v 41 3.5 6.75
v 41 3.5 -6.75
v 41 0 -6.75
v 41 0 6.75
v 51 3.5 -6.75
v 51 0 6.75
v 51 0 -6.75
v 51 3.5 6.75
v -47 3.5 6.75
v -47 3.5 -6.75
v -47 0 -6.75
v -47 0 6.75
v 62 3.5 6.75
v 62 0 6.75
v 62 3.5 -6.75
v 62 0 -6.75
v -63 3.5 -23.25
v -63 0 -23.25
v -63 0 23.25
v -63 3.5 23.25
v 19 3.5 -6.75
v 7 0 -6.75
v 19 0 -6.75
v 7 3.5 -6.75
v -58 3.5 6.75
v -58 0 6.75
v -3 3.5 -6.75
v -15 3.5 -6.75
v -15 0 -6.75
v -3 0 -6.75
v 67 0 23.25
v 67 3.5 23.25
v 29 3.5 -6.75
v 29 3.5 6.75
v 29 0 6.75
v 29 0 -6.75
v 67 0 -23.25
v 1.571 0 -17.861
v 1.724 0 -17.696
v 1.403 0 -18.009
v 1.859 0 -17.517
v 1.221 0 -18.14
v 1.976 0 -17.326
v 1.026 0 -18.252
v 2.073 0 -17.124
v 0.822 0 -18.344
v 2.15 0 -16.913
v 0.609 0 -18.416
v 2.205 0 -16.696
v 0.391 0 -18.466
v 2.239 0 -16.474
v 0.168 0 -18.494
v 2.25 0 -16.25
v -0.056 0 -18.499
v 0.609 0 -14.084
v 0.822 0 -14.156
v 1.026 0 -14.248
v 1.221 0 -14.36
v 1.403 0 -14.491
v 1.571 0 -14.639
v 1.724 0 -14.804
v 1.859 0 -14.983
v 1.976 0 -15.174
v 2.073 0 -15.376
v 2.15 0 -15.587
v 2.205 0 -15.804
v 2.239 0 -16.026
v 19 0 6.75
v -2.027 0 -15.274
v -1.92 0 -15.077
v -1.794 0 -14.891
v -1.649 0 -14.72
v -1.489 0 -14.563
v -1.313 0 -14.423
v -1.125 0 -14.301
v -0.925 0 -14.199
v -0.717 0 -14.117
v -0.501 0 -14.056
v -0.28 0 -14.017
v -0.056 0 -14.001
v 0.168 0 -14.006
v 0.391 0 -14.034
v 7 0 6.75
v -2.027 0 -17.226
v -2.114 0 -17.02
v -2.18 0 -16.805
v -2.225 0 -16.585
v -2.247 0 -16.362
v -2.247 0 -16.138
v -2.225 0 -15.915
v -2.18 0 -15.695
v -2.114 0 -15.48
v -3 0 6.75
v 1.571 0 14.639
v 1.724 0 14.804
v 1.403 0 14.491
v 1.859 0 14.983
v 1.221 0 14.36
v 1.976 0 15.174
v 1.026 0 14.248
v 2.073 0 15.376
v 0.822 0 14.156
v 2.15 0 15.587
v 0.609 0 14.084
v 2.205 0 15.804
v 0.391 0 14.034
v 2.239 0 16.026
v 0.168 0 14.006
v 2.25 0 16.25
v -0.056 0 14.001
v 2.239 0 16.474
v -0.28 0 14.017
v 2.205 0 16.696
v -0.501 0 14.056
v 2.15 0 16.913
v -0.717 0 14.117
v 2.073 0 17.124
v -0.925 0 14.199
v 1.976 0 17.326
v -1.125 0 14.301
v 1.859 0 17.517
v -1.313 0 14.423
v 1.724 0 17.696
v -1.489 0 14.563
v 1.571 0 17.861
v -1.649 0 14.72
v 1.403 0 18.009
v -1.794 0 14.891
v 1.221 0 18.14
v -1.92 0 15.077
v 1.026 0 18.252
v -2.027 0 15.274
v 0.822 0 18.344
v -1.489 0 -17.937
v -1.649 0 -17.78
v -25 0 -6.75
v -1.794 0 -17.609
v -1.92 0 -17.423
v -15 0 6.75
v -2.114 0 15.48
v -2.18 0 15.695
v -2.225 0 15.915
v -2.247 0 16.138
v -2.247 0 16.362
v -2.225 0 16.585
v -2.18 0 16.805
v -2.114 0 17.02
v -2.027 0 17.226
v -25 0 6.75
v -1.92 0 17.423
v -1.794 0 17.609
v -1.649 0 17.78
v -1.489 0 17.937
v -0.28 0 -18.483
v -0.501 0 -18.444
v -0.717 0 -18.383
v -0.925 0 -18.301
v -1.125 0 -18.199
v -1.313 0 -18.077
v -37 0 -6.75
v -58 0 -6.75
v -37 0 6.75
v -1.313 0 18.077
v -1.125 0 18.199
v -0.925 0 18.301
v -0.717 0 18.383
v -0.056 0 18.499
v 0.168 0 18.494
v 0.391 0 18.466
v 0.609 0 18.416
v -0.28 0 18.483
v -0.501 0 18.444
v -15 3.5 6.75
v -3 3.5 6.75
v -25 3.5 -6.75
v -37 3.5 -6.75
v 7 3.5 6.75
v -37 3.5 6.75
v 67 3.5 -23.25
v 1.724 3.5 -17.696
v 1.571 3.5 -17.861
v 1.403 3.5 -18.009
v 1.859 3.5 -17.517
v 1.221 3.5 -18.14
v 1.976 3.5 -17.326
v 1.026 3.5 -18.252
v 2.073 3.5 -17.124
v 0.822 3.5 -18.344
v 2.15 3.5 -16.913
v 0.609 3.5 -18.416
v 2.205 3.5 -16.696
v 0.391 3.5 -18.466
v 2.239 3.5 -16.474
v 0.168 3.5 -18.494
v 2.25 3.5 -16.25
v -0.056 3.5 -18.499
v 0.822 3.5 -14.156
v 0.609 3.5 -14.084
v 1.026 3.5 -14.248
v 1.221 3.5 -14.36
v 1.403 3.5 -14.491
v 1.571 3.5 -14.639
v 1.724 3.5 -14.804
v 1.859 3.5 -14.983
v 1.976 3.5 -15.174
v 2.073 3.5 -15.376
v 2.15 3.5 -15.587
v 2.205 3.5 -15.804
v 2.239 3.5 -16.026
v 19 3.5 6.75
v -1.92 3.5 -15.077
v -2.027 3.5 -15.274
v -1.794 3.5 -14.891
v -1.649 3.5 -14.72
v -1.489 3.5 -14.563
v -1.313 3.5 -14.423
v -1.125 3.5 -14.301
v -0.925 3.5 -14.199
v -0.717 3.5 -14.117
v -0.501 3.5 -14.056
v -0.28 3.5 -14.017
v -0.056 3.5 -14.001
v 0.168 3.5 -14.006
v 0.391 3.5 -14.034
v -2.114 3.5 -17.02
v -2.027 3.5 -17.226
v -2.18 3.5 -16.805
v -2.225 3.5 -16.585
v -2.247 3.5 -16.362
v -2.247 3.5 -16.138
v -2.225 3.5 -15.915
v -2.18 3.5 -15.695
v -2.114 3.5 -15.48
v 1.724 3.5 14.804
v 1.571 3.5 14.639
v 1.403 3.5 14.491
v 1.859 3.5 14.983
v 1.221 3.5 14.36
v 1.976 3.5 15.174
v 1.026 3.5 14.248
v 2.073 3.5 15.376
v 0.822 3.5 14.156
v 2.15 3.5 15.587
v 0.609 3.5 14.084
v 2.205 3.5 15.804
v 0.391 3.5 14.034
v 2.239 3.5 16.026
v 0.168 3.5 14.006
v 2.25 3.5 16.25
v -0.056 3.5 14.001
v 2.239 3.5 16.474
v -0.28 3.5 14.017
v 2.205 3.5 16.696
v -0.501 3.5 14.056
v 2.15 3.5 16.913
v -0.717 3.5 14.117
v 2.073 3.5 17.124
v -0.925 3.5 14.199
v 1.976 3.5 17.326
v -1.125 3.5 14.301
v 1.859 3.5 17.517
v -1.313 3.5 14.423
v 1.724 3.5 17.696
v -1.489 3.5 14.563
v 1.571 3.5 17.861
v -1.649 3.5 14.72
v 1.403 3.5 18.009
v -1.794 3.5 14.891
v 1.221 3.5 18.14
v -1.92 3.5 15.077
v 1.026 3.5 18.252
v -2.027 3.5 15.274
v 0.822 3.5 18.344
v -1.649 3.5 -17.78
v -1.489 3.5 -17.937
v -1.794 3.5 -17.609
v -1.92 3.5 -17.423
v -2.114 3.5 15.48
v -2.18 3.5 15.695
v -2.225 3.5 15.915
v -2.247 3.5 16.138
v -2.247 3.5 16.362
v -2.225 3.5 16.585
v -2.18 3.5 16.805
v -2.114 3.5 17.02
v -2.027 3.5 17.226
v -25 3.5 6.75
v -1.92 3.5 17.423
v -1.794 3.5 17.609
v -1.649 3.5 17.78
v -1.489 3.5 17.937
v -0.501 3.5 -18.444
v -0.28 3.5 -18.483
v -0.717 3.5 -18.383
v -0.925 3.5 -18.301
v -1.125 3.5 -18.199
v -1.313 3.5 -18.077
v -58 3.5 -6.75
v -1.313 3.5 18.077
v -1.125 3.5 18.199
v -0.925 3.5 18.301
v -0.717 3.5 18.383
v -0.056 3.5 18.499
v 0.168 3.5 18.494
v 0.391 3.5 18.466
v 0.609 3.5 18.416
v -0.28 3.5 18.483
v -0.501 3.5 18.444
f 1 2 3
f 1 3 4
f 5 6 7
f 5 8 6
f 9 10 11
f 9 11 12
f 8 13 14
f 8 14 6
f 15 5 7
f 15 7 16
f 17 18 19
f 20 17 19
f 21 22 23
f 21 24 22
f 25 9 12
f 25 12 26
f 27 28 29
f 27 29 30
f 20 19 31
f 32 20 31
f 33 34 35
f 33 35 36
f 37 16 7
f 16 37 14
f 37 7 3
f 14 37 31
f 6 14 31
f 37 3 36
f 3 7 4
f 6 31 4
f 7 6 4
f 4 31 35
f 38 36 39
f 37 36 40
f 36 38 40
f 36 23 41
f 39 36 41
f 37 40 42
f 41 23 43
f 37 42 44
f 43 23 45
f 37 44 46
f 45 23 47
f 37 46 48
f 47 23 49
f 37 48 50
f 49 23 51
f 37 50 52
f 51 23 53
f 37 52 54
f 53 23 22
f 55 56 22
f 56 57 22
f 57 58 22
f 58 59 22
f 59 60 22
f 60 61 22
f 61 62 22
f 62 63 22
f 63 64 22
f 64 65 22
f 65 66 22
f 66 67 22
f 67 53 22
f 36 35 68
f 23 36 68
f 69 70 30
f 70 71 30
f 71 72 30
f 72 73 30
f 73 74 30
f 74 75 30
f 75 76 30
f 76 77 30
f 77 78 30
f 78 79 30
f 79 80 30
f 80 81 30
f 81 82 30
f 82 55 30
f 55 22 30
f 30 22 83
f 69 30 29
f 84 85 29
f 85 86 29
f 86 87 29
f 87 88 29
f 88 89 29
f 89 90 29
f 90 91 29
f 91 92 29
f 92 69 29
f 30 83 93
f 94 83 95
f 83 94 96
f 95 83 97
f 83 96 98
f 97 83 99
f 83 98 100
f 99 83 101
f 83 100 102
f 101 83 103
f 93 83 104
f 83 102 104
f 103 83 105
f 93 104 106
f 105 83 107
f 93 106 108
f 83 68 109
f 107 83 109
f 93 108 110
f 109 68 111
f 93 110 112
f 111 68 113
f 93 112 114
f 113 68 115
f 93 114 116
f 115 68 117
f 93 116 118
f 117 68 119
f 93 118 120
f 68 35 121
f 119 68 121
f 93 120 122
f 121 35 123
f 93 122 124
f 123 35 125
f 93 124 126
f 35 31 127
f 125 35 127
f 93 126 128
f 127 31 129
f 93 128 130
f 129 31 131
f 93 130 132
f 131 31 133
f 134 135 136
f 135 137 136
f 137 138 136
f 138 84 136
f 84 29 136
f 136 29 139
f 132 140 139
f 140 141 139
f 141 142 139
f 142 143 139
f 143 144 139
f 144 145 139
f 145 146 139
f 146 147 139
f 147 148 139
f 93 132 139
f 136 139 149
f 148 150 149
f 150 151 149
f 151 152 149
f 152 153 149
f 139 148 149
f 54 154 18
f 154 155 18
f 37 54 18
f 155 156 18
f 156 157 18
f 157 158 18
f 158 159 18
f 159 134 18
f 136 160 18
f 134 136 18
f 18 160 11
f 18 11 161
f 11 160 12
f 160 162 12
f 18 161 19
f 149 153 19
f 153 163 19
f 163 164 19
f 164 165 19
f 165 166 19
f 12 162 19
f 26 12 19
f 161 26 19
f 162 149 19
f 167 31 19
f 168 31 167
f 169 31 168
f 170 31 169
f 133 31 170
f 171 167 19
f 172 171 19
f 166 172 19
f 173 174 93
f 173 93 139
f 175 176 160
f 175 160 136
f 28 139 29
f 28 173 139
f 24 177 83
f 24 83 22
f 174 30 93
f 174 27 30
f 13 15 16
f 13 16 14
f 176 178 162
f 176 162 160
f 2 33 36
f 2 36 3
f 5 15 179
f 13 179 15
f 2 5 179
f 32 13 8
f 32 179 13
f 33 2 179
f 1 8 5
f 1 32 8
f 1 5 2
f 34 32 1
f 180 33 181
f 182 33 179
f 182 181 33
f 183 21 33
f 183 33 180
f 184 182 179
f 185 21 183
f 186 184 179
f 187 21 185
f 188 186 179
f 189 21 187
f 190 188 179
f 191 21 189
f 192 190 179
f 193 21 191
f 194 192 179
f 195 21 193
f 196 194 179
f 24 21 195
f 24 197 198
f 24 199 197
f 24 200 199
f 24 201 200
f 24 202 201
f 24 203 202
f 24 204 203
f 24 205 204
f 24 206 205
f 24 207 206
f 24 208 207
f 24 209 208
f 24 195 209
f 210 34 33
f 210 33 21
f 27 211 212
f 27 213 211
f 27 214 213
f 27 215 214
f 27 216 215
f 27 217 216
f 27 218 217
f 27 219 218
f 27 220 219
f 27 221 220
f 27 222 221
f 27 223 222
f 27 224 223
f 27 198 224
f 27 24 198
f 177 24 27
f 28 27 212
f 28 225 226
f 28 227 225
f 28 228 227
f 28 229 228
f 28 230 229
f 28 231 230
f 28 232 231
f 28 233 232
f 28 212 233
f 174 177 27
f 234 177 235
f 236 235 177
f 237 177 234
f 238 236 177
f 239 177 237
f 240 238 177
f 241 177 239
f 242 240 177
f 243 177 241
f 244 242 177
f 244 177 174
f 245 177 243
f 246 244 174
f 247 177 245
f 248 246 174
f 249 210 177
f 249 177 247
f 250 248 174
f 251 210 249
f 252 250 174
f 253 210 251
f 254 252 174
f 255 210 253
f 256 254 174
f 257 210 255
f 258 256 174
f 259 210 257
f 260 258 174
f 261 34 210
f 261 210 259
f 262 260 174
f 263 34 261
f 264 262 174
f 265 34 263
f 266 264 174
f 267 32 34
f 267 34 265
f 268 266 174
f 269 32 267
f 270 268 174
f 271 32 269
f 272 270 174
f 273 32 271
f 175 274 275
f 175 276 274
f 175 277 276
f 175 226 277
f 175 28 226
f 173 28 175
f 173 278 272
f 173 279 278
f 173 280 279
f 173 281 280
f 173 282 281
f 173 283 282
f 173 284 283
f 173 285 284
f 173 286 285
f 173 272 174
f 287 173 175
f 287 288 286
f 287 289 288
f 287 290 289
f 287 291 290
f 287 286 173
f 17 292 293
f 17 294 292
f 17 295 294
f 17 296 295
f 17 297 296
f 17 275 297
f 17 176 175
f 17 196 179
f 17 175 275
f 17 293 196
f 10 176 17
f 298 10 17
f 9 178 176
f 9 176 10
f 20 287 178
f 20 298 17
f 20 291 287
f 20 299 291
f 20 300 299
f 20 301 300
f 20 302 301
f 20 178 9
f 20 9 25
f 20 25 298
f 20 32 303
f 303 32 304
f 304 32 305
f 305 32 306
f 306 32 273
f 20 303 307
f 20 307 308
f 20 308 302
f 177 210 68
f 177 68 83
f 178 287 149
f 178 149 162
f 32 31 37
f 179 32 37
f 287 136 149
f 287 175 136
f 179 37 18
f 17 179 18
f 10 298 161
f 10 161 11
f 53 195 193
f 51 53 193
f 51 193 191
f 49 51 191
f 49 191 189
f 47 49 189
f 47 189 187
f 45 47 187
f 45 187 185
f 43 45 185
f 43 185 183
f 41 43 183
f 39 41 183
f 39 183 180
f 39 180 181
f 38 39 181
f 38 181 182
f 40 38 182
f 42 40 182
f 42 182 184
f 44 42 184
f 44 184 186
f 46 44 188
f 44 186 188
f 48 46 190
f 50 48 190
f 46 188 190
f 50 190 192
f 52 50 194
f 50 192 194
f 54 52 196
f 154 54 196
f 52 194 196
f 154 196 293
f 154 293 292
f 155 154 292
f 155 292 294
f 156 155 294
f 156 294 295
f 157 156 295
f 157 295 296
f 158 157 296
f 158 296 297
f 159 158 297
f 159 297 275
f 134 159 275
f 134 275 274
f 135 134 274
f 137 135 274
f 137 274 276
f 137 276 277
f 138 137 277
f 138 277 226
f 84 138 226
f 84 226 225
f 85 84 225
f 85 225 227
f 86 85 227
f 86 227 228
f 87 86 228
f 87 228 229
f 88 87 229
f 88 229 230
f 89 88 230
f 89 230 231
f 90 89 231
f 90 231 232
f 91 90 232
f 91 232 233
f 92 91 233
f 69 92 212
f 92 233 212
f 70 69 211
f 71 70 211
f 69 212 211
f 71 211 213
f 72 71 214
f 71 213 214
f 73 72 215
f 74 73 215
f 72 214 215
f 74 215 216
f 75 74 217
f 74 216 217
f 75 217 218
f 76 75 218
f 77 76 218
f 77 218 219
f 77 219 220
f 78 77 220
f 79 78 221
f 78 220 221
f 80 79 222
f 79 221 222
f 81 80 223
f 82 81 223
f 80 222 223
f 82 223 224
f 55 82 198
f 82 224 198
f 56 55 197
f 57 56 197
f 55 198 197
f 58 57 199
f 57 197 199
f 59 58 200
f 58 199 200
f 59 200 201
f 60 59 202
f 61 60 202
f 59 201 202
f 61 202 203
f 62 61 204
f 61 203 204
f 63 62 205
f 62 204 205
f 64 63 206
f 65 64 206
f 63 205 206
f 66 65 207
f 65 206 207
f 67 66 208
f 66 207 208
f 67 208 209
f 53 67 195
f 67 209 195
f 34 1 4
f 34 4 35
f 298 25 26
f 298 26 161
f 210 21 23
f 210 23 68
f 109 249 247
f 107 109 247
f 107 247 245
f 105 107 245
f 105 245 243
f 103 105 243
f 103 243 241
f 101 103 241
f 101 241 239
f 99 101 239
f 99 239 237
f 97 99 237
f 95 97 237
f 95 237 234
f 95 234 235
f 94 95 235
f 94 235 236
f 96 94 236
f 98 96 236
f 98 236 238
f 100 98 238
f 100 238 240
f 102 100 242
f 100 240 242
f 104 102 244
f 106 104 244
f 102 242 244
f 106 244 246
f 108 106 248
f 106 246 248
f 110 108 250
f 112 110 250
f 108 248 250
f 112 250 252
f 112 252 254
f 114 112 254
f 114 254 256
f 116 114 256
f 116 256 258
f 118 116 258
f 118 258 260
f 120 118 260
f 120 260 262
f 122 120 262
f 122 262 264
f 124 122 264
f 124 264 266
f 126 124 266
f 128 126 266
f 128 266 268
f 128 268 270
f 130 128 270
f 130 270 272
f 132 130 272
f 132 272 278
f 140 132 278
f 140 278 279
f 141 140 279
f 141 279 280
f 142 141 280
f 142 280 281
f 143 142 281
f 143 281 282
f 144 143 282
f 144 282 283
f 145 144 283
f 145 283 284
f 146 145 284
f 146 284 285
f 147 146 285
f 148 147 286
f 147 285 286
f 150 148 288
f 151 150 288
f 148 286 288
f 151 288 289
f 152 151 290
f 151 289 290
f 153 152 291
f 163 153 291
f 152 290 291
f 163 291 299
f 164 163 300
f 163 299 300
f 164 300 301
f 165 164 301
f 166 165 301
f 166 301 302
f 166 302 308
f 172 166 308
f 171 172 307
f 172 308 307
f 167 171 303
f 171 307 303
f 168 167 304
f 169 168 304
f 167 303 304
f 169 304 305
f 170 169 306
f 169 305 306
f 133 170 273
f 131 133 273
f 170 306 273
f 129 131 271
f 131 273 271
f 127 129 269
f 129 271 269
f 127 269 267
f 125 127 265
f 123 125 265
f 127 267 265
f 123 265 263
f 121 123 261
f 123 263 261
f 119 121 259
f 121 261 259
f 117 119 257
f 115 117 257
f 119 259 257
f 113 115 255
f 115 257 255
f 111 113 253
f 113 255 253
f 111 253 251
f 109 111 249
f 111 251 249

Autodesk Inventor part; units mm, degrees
ref_plane "YZ Plane" through (0, 0, 0) normal (1, 0, 0) x (0, 1, 0)
ref_plane "XZ Plane" through (0, 0, 0) normal (0, 1, 0) x (-1, 0, 0)
ref_plane "XY Plane" through (0, 0, 0) normal (0, 0, 1) x (1, 0, 0)
sketch "Sketch1" plane through (0, 0, 0) normal (0, 1, 0) x (-1, 0, 0)
  line L0 (63, 23.25) -> (-67, 23.25)
  line L1 (-67, 23.25) -> (-67, -23.25)
  line L2 (-67, -23.25) -> (63, -23.25)
  line L3 (63, -23.25) -> (63, 23.25)
  point P0 (0, 0)
  dimension "d1" = 46.5
  dimension "d2" = 23.25
  dimension "d3" = 130
  dimension "d4" = 67
extrude "Extrusion1" add sketch "Sketch1" along normal blind 3.5
sketch "Sketch3" plane through (0, 3.5, 0) normal (0, 1, 0) x (1, 0, 0)
  line L0 (-58, 6.75) -> (-47, 6.75)
  line L1 (-47, 6.75) -> (-47, -6.75)
  line L2 (-47, -6.75) -> (-58, -6.75)
  line L3 (-58, -6.75) -> (-58, 6.75)
  line L4 (-37, 6.75) -> (-25, 6.75)
  line L5 (-25, 6.75) -> (-25, -6.75)
  line L6 (-25, -6.75) -> (-37, -6.75)
  line L7 (-37, -6.75) -> (-37, 6.75)
  line L8 (-15, 6.75) -> (-3, 6.75)
  line L9 (-3, 6.75) -> (-3, -6.75)
  line L10 (-3, -6.75) -> (-15, -6.75)
  line L11 (-15, -6.75) -> (-15, 6.75)
  line L12 (7, 6.75) -> (19, 6.75)
  line L13 (19, 6.75) -> (19, -6.75)
  line L14 (19, -6.75) -> (7, -6.75)
  line L15 (7, -6.75) -> (7, 6.75)
  line L16 (29, 6.75) -> (41, 6.75)
  line L17 (41, 6.75) -> (41, -6.75)
  line L18 (41, -6.75) -> (29, -6.75)
  line L19 (29, -6.75) -> (29, 6.75)
  line L20 (51, 6.75) -> (62, 6.75)
  line L21 (62, 6.75) -> (62, -6.75)
  line L22 (62, -6.75) -> (51, -6.75)
  line L23 (51, -6.75) -> (51, 6.75)
  line L24 (67, 23.25) -> (-63, 23.25) projected
  line L25 (-63, -23.25) -> (67, -23.25) projected
  line L26 (-63, 23.25) -> (-63, -23.25) projected
  line L27 (67, -23.25) -> (67, 23.25) projected
  point P0 (0, 0)
  dimension "d21" = 16.5
  dimension "d22" = 16.5
  dimension "d23" = 5
  dimension "d24" = 10
  dimension "d25" = 10
  dimension "d26" = 10
  dimension "d27" = 10
  dimension "d28" = 5
  dimension "d29" = 16
  dimension "d30" = 38
  dimension "d31" = 60
  dimension "d32" = 60
  dimension "d33" = 38
  dimension "d34" = 16
extrude "Extrusion3" cut sketch "Sketch3" against normal blind 10 contours L0 L1 L2 L3 | L4 L5 L6 L7 | L8 L9 L10 L11 | L12 L13 L14 L15 | L16 L17 L18 L19 | L20 L21 L22 L23
sketch "Sketch4" plane through (0, 3.5, 0) normal (0, 1, 0) x (1, 0, 0)
  point P0 (0, 0)
sketch "Sketch5" plane through (0, 3.5, 0) normal (0, 1, 0) x (1, 0, 0)
  circle A0 centre (0, 16.25) radius 2.25
  circle A1 centre (0, -16.25) radius 2.25
  line L0 (67, 23.25) -> (-63, 23.25) projected
  line L1 (67, -23.25) -> (67, 23.25) projected
  line L2 (-63, -23.25) -> (67, -23.25) projected
  point P0 (0, 0)
  dimension "d37" = 4.5
  dimension "d38" = 4.5
  dimension "d39" = 7
  dimension "d40" = 67
  dimension "d41" = 7
  dimension "d42" = 67
extrude "Extrusion4" cut sketch "Sketch5" against normal blind 3.5
properties part number "MILESTONE3LID"
